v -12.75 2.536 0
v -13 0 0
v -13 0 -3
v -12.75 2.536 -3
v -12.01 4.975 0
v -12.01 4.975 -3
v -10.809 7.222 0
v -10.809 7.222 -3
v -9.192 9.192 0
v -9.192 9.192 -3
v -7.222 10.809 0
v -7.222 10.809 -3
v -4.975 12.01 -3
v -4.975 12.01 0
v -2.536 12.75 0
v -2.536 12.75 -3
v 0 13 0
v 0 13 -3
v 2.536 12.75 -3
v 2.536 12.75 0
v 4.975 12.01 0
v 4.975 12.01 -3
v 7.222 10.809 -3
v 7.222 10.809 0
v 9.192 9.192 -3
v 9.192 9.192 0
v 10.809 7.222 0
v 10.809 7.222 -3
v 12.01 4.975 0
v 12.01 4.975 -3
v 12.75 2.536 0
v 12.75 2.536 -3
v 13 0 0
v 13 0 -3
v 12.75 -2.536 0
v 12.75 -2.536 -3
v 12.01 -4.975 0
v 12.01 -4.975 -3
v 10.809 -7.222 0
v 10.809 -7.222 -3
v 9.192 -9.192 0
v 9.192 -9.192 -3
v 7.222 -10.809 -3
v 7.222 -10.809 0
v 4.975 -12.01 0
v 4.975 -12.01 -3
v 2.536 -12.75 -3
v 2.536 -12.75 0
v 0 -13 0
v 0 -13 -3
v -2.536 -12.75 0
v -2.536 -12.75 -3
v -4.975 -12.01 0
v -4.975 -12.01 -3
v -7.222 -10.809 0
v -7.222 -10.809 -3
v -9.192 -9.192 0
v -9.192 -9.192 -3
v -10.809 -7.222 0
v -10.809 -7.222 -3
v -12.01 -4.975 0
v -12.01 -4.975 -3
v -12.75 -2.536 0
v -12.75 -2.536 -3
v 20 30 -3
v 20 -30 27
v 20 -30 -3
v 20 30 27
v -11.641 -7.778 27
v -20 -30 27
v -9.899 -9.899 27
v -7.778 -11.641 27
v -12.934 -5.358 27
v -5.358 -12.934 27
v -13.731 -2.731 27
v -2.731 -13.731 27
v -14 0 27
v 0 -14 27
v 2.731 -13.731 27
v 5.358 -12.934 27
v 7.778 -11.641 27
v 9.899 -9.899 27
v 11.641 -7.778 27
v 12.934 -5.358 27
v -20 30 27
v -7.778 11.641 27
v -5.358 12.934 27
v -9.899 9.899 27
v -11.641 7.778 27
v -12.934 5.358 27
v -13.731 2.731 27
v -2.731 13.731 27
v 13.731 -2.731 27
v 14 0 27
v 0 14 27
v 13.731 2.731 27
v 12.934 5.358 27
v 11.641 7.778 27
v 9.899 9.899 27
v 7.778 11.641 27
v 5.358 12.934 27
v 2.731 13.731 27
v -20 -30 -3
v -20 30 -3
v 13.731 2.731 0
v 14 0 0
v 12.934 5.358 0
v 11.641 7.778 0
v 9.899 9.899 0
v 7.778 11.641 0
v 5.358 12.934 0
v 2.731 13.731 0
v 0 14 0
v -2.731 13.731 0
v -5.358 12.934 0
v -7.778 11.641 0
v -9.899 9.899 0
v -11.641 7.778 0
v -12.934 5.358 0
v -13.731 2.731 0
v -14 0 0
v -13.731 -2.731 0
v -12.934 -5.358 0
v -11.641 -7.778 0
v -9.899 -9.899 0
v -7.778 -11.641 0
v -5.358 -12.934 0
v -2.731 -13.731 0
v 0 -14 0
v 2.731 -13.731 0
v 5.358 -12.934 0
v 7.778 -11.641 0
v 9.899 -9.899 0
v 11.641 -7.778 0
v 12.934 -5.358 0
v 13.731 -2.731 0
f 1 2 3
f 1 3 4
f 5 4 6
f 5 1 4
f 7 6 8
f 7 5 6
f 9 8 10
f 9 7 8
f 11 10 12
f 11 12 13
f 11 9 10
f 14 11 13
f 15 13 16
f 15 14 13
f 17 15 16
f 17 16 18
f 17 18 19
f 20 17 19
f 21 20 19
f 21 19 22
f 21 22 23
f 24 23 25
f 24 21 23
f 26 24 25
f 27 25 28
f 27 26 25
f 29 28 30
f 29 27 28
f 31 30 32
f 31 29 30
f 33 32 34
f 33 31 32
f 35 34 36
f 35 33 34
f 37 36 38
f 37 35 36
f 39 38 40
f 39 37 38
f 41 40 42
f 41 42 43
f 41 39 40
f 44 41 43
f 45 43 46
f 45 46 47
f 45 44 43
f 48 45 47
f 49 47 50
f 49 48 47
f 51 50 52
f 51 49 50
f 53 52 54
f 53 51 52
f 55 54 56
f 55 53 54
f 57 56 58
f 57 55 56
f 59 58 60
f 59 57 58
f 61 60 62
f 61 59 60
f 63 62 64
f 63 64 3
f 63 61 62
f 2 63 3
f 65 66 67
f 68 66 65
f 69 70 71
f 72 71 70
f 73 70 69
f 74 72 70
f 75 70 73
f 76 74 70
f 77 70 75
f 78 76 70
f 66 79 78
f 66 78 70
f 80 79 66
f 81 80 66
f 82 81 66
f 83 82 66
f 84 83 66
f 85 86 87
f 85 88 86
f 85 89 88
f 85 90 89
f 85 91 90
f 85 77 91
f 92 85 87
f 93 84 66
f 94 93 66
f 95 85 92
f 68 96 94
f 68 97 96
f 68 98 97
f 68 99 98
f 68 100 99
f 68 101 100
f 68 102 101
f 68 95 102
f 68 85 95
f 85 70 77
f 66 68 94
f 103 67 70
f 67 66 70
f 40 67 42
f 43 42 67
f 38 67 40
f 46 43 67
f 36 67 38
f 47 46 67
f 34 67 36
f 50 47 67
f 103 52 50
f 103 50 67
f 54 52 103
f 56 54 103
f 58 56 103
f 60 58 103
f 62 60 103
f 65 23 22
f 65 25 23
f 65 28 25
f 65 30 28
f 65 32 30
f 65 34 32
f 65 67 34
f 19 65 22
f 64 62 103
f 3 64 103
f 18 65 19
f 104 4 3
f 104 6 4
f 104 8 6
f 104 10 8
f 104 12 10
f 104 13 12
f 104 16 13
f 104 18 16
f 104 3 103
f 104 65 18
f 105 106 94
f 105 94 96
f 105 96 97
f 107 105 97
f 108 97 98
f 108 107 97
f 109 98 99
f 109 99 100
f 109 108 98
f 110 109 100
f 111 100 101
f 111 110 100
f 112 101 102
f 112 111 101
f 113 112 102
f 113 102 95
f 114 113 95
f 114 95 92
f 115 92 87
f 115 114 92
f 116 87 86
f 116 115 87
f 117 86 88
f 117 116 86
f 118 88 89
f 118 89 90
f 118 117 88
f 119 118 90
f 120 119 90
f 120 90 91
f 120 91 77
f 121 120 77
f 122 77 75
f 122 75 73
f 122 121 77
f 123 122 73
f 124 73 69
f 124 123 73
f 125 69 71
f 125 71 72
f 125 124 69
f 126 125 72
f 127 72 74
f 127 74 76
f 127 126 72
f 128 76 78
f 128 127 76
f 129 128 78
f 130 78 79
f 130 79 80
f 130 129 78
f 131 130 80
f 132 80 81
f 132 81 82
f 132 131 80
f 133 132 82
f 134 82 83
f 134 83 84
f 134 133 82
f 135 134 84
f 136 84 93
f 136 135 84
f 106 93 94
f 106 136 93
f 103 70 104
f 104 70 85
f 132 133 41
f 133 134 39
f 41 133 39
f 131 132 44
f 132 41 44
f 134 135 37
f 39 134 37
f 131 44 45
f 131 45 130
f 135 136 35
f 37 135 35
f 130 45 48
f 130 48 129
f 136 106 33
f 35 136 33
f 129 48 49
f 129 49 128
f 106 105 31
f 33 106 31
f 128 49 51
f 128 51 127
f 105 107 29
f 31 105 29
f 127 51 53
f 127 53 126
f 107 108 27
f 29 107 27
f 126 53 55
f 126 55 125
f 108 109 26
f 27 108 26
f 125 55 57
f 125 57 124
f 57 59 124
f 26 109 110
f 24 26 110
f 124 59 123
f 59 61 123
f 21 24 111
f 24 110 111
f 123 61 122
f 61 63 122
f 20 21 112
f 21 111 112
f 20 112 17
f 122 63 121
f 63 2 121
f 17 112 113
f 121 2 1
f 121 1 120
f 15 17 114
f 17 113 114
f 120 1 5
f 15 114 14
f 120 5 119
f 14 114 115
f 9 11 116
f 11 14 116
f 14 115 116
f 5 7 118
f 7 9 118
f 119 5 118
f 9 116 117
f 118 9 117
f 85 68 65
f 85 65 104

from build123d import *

# Parameters (mm, degrees)
SKETCH1_W           = 40
SKETCH1_H           = 60
SKETCH1_R           = 14
BOSS_EXTRUDE1_DEPTH = 27
SKETCH2_W           = 40
SKETCH2_H           = 60
SKETCH2_R           = 13
BOSS_EXTRUDE2_DEPTH = 3


with BuildPart() as part:
    # Sketch1 → Boss-Extrude1 (new body)
    with BuildSketch(Plane.XY):
        Rectangle(SKETCH1_W, SKETCH1_H)
        Circle(SKETCH1_R, mode=Mode.SUBTRACT)
    extrude(amount=BOSS_EXTRUDE1_DEPTH)

    # Sketch2 → Boss-Extrude2 (add)
    with BuildSketch(Plane(origin=(0, 0, 0), x_dir=(-1, 0, 0), z_dir=(0, 0, -1))):
        Rectangle(SKETCH2_W, SKETCH2_H)
        Circle(SKETCH2_R, mode=Mode.SUBTRACT)
    extrude(amount=BOSS_EXTRUDE2_DEPTH)


solid = part.part
